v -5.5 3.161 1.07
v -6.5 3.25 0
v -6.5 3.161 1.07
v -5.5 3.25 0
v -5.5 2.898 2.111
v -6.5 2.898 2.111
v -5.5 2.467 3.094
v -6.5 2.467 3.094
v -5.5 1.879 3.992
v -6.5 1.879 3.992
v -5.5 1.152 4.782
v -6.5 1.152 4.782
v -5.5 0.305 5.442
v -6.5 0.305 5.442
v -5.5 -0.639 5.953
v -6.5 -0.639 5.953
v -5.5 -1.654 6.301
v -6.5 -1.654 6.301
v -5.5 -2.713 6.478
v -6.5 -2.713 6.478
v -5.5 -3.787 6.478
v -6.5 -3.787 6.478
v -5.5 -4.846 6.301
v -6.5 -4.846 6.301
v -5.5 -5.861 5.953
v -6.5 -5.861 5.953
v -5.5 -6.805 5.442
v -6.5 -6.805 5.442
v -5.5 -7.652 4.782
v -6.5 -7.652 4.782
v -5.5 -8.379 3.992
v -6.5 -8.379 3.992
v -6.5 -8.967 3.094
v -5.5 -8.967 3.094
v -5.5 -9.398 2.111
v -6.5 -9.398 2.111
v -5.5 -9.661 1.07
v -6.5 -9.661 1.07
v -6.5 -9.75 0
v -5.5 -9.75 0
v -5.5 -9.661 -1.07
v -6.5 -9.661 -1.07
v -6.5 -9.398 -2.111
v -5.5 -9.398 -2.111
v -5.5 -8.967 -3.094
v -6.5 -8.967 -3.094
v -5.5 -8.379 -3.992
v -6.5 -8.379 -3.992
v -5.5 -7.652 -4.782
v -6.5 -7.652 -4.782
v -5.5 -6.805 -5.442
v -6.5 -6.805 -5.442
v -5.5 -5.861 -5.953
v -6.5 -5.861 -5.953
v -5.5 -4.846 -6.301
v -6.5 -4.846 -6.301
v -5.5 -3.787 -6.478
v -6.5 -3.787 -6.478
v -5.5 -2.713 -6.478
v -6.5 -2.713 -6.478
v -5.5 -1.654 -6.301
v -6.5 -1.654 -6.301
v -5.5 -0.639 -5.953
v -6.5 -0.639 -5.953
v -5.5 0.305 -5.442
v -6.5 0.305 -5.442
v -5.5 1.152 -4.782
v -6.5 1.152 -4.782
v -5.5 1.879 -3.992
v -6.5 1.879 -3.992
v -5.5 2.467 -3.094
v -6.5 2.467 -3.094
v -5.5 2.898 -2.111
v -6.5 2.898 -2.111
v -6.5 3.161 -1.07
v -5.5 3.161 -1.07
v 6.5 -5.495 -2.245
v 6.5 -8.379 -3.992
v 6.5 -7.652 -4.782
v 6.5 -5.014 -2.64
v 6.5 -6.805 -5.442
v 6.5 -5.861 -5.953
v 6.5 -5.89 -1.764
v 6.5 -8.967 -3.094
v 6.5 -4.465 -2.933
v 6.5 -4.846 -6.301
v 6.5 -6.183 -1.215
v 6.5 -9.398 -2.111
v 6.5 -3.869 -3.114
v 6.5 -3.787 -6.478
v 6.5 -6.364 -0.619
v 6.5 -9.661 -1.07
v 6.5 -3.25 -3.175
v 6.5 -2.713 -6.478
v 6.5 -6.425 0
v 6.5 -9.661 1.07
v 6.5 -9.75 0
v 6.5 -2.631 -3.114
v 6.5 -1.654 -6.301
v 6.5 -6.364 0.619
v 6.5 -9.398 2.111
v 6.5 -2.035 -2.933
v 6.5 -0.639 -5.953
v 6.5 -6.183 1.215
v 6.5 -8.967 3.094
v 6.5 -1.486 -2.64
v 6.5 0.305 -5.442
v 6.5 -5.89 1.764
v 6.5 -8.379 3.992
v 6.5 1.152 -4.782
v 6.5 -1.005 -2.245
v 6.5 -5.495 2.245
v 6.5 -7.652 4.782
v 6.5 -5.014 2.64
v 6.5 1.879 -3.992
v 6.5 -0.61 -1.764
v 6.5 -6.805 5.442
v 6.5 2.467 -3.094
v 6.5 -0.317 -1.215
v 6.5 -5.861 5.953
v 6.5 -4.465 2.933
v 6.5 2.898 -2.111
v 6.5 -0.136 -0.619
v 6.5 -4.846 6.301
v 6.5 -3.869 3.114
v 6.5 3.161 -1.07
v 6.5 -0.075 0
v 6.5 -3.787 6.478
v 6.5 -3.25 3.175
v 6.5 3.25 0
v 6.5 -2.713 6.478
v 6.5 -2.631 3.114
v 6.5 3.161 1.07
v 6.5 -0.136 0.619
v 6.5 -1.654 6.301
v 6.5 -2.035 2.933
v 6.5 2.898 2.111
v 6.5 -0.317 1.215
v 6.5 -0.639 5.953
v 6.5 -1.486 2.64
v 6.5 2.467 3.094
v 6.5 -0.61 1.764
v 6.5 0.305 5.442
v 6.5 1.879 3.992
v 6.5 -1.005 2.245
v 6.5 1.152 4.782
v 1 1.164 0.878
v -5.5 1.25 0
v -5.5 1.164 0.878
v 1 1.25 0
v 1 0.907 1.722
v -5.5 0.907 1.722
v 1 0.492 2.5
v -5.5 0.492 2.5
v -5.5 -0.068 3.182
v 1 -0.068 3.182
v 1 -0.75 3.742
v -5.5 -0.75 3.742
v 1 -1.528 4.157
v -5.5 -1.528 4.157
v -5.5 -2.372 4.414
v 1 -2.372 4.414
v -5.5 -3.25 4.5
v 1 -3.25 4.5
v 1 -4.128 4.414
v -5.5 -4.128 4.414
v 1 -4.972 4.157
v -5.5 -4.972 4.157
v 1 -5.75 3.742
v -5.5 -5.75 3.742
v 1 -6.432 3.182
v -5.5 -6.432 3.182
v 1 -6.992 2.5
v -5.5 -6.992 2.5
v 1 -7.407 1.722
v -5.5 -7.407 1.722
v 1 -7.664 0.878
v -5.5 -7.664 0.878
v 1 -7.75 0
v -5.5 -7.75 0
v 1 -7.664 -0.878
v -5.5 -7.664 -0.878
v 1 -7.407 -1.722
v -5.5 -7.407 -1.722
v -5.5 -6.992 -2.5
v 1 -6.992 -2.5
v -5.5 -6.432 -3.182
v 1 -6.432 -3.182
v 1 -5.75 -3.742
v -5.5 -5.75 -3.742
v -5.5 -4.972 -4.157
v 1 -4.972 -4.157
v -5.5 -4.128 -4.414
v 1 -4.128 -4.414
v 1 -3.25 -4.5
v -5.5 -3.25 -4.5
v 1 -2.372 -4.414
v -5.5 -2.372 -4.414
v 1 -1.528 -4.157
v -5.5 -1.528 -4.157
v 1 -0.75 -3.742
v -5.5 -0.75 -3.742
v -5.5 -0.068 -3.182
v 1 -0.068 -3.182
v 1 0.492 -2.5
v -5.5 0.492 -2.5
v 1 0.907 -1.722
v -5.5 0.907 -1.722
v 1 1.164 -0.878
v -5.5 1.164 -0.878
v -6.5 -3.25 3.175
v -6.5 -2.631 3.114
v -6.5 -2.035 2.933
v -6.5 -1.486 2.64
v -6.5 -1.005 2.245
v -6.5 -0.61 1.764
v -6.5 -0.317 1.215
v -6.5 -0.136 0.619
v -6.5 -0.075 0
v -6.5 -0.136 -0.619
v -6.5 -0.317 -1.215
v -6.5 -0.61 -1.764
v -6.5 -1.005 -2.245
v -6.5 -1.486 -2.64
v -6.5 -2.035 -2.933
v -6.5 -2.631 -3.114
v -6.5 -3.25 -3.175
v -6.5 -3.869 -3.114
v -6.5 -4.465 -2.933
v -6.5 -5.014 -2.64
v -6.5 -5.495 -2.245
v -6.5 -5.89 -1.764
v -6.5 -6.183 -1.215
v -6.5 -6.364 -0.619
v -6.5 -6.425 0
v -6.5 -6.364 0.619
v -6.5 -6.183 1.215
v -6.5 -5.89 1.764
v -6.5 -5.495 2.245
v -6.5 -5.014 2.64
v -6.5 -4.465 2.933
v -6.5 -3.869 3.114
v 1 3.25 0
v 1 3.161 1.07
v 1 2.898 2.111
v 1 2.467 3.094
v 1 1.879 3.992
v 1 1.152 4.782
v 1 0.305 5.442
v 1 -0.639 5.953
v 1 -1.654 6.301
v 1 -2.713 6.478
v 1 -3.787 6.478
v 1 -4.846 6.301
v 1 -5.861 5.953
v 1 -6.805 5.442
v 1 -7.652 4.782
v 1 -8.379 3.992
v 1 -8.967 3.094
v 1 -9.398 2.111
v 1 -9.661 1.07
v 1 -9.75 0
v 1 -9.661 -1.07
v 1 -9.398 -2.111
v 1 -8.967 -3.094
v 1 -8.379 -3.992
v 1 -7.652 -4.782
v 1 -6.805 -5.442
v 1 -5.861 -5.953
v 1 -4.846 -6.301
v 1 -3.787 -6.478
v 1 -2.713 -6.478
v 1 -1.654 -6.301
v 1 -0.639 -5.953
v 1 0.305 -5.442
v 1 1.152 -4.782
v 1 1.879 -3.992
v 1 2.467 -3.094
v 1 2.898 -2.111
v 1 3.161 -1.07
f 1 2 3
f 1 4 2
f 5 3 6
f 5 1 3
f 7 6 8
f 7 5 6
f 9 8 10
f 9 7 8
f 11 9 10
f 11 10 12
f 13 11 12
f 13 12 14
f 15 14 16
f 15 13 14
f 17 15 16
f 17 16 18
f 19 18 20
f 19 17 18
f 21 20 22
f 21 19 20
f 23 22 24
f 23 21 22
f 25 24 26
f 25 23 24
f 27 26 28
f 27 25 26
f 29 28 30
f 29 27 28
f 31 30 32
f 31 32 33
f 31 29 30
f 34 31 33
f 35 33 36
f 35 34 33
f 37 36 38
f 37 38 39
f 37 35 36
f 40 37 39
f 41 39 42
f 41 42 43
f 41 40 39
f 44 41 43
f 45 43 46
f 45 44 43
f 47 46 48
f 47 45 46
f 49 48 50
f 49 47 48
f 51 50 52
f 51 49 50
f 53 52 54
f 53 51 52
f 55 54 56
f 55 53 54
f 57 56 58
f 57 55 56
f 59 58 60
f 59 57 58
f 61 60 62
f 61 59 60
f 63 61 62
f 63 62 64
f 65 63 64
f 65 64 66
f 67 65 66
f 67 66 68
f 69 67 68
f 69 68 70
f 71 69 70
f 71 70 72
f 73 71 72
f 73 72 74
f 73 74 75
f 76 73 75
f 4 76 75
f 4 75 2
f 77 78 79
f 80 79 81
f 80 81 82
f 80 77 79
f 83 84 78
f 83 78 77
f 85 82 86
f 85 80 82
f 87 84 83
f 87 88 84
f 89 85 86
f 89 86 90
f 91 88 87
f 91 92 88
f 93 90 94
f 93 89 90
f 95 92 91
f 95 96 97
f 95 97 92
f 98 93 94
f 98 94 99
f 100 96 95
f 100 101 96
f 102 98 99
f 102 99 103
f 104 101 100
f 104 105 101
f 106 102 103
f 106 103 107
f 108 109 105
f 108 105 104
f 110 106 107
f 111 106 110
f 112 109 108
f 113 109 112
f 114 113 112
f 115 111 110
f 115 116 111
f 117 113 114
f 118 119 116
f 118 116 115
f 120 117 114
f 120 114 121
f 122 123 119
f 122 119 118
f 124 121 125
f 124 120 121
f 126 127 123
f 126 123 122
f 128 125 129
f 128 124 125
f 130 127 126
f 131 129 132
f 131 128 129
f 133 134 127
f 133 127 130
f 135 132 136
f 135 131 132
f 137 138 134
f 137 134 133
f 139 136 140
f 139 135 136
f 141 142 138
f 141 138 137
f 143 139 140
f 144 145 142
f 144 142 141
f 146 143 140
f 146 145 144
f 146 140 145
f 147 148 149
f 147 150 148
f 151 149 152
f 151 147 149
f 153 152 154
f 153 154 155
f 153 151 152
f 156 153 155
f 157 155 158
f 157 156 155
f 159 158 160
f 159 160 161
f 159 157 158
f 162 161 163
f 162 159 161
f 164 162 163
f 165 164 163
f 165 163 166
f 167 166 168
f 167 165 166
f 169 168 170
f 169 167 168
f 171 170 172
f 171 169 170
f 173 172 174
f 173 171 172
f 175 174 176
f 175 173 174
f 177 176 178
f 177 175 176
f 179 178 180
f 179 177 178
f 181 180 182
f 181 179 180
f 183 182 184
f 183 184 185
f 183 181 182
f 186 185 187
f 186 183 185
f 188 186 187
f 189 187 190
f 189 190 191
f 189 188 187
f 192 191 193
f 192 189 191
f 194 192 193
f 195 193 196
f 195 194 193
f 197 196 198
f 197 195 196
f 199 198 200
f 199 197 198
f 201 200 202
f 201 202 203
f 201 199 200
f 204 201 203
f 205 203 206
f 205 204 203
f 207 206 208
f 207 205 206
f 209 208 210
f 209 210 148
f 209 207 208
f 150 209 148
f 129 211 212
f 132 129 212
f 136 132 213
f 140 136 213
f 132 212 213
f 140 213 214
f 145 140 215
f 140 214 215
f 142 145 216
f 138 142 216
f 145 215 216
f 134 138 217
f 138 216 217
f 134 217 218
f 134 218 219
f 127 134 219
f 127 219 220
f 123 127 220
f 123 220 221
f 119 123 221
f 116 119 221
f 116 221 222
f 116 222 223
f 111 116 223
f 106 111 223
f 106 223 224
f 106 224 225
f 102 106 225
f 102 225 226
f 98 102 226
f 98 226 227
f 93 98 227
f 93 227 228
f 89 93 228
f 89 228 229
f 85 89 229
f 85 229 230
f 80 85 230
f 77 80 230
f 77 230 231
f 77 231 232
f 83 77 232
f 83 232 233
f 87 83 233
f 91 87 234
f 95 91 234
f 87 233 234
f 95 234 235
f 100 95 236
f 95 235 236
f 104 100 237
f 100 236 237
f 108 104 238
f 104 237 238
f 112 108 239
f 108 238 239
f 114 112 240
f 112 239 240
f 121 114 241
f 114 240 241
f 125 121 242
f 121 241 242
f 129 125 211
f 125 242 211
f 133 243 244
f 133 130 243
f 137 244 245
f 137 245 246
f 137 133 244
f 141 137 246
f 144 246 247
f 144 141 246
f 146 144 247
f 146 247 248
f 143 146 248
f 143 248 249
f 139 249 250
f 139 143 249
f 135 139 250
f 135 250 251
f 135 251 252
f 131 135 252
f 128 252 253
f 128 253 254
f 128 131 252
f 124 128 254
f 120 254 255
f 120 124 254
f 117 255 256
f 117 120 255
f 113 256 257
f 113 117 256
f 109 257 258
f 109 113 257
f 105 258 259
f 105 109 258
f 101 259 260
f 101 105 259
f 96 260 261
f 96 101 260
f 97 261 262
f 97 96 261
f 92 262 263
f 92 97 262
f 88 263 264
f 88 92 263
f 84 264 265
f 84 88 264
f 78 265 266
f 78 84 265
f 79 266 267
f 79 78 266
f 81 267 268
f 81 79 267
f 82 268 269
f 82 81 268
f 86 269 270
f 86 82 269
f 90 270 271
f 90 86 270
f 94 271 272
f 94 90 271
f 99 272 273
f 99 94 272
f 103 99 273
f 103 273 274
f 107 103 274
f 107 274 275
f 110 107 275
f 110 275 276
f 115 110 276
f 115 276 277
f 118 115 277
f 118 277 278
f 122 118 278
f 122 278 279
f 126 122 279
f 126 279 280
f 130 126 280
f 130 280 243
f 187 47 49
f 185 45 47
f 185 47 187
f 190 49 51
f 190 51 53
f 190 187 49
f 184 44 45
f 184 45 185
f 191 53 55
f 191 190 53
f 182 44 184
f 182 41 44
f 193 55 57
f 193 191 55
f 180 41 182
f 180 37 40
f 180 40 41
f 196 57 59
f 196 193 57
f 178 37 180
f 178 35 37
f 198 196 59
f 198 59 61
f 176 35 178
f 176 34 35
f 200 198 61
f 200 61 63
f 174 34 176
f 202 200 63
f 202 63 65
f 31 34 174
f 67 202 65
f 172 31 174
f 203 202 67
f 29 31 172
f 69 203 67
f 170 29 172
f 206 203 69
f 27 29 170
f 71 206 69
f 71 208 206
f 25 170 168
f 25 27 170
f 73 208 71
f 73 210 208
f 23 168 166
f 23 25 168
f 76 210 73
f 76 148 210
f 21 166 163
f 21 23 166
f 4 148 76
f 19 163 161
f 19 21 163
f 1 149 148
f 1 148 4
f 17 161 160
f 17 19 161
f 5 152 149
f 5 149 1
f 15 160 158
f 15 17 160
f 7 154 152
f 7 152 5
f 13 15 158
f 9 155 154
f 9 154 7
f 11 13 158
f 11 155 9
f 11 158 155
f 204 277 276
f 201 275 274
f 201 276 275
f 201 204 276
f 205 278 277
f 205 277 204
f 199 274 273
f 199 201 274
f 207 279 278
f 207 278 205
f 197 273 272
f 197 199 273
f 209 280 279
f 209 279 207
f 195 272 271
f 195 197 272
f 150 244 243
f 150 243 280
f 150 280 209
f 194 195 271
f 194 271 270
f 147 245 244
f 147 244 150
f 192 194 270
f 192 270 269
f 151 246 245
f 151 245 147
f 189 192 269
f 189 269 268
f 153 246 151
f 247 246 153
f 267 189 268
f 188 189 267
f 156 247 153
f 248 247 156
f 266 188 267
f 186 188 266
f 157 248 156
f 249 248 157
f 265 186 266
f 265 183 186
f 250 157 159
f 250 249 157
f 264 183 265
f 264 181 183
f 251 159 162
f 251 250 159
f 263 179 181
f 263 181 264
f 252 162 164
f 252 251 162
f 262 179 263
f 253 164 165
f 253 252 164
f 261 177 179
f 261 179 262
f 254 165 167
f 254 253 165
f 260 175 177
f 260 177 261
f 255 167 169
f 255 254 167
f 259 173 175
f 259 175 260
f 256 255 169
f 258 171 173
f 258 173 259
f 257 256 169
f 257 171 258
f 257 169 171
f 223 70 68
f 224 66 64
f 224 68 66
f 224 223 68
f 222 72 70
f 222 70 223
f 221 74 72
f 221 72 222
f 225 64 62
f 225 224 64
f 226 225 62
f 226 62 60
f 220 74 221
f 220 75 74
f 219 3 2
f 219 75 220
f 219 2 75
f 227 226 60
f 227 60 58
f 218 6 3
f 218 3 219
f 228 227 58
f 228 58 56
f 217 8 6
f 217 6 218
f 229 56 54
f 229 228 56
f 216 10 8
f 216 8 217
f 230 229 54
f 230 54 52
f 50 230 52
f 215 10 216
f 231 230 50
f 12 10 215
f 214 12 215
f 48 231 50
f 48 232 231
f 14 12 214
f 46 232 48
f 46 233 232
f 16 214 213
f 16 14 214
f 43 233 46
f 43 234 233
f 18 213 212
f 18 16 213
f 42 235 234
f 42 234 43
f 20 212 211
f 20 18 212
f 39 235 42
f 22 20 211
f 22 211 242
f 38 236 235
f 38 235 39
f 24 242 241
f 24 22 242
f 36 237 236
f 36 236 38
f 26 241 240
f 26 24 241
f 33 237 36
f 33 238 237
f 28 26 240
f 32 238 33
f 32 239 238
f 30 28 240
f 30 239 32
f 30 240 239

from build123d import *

# Parameters (mm, degrees)
SKETCH_2_R          = 3.175
CUT_EXTRUDE_1_DEPTH = 14


with BuildPart() as part:
    # 草图1 → 旋转1 (revolve)
    with BuildSketch(Plane.XY):
        Polygon((6.5, -3.25), (-6.5, -3.25), (-6.5, 3.25), (-5.5, 3.25), (-5.5, 1.25), (1, 1.25), (1, 3.25), (6.5, 3.25), align=None)
    revolve(axis=Axis((-6.5, -3.25, 0), (1, 0, 0)))

    # 草图2 → 切除-拉伸1 (cut, through all)
    with BuildSketch(Plane.ZY.offset(6.5)):
        with Locations((0, -3.25)):
            Circle(SKETCH_2_R)
    extrude(amount=-CUT_EXTRUDE_1_DEPTH, mode=Mode.SUBTRACT)


solid = part.part
